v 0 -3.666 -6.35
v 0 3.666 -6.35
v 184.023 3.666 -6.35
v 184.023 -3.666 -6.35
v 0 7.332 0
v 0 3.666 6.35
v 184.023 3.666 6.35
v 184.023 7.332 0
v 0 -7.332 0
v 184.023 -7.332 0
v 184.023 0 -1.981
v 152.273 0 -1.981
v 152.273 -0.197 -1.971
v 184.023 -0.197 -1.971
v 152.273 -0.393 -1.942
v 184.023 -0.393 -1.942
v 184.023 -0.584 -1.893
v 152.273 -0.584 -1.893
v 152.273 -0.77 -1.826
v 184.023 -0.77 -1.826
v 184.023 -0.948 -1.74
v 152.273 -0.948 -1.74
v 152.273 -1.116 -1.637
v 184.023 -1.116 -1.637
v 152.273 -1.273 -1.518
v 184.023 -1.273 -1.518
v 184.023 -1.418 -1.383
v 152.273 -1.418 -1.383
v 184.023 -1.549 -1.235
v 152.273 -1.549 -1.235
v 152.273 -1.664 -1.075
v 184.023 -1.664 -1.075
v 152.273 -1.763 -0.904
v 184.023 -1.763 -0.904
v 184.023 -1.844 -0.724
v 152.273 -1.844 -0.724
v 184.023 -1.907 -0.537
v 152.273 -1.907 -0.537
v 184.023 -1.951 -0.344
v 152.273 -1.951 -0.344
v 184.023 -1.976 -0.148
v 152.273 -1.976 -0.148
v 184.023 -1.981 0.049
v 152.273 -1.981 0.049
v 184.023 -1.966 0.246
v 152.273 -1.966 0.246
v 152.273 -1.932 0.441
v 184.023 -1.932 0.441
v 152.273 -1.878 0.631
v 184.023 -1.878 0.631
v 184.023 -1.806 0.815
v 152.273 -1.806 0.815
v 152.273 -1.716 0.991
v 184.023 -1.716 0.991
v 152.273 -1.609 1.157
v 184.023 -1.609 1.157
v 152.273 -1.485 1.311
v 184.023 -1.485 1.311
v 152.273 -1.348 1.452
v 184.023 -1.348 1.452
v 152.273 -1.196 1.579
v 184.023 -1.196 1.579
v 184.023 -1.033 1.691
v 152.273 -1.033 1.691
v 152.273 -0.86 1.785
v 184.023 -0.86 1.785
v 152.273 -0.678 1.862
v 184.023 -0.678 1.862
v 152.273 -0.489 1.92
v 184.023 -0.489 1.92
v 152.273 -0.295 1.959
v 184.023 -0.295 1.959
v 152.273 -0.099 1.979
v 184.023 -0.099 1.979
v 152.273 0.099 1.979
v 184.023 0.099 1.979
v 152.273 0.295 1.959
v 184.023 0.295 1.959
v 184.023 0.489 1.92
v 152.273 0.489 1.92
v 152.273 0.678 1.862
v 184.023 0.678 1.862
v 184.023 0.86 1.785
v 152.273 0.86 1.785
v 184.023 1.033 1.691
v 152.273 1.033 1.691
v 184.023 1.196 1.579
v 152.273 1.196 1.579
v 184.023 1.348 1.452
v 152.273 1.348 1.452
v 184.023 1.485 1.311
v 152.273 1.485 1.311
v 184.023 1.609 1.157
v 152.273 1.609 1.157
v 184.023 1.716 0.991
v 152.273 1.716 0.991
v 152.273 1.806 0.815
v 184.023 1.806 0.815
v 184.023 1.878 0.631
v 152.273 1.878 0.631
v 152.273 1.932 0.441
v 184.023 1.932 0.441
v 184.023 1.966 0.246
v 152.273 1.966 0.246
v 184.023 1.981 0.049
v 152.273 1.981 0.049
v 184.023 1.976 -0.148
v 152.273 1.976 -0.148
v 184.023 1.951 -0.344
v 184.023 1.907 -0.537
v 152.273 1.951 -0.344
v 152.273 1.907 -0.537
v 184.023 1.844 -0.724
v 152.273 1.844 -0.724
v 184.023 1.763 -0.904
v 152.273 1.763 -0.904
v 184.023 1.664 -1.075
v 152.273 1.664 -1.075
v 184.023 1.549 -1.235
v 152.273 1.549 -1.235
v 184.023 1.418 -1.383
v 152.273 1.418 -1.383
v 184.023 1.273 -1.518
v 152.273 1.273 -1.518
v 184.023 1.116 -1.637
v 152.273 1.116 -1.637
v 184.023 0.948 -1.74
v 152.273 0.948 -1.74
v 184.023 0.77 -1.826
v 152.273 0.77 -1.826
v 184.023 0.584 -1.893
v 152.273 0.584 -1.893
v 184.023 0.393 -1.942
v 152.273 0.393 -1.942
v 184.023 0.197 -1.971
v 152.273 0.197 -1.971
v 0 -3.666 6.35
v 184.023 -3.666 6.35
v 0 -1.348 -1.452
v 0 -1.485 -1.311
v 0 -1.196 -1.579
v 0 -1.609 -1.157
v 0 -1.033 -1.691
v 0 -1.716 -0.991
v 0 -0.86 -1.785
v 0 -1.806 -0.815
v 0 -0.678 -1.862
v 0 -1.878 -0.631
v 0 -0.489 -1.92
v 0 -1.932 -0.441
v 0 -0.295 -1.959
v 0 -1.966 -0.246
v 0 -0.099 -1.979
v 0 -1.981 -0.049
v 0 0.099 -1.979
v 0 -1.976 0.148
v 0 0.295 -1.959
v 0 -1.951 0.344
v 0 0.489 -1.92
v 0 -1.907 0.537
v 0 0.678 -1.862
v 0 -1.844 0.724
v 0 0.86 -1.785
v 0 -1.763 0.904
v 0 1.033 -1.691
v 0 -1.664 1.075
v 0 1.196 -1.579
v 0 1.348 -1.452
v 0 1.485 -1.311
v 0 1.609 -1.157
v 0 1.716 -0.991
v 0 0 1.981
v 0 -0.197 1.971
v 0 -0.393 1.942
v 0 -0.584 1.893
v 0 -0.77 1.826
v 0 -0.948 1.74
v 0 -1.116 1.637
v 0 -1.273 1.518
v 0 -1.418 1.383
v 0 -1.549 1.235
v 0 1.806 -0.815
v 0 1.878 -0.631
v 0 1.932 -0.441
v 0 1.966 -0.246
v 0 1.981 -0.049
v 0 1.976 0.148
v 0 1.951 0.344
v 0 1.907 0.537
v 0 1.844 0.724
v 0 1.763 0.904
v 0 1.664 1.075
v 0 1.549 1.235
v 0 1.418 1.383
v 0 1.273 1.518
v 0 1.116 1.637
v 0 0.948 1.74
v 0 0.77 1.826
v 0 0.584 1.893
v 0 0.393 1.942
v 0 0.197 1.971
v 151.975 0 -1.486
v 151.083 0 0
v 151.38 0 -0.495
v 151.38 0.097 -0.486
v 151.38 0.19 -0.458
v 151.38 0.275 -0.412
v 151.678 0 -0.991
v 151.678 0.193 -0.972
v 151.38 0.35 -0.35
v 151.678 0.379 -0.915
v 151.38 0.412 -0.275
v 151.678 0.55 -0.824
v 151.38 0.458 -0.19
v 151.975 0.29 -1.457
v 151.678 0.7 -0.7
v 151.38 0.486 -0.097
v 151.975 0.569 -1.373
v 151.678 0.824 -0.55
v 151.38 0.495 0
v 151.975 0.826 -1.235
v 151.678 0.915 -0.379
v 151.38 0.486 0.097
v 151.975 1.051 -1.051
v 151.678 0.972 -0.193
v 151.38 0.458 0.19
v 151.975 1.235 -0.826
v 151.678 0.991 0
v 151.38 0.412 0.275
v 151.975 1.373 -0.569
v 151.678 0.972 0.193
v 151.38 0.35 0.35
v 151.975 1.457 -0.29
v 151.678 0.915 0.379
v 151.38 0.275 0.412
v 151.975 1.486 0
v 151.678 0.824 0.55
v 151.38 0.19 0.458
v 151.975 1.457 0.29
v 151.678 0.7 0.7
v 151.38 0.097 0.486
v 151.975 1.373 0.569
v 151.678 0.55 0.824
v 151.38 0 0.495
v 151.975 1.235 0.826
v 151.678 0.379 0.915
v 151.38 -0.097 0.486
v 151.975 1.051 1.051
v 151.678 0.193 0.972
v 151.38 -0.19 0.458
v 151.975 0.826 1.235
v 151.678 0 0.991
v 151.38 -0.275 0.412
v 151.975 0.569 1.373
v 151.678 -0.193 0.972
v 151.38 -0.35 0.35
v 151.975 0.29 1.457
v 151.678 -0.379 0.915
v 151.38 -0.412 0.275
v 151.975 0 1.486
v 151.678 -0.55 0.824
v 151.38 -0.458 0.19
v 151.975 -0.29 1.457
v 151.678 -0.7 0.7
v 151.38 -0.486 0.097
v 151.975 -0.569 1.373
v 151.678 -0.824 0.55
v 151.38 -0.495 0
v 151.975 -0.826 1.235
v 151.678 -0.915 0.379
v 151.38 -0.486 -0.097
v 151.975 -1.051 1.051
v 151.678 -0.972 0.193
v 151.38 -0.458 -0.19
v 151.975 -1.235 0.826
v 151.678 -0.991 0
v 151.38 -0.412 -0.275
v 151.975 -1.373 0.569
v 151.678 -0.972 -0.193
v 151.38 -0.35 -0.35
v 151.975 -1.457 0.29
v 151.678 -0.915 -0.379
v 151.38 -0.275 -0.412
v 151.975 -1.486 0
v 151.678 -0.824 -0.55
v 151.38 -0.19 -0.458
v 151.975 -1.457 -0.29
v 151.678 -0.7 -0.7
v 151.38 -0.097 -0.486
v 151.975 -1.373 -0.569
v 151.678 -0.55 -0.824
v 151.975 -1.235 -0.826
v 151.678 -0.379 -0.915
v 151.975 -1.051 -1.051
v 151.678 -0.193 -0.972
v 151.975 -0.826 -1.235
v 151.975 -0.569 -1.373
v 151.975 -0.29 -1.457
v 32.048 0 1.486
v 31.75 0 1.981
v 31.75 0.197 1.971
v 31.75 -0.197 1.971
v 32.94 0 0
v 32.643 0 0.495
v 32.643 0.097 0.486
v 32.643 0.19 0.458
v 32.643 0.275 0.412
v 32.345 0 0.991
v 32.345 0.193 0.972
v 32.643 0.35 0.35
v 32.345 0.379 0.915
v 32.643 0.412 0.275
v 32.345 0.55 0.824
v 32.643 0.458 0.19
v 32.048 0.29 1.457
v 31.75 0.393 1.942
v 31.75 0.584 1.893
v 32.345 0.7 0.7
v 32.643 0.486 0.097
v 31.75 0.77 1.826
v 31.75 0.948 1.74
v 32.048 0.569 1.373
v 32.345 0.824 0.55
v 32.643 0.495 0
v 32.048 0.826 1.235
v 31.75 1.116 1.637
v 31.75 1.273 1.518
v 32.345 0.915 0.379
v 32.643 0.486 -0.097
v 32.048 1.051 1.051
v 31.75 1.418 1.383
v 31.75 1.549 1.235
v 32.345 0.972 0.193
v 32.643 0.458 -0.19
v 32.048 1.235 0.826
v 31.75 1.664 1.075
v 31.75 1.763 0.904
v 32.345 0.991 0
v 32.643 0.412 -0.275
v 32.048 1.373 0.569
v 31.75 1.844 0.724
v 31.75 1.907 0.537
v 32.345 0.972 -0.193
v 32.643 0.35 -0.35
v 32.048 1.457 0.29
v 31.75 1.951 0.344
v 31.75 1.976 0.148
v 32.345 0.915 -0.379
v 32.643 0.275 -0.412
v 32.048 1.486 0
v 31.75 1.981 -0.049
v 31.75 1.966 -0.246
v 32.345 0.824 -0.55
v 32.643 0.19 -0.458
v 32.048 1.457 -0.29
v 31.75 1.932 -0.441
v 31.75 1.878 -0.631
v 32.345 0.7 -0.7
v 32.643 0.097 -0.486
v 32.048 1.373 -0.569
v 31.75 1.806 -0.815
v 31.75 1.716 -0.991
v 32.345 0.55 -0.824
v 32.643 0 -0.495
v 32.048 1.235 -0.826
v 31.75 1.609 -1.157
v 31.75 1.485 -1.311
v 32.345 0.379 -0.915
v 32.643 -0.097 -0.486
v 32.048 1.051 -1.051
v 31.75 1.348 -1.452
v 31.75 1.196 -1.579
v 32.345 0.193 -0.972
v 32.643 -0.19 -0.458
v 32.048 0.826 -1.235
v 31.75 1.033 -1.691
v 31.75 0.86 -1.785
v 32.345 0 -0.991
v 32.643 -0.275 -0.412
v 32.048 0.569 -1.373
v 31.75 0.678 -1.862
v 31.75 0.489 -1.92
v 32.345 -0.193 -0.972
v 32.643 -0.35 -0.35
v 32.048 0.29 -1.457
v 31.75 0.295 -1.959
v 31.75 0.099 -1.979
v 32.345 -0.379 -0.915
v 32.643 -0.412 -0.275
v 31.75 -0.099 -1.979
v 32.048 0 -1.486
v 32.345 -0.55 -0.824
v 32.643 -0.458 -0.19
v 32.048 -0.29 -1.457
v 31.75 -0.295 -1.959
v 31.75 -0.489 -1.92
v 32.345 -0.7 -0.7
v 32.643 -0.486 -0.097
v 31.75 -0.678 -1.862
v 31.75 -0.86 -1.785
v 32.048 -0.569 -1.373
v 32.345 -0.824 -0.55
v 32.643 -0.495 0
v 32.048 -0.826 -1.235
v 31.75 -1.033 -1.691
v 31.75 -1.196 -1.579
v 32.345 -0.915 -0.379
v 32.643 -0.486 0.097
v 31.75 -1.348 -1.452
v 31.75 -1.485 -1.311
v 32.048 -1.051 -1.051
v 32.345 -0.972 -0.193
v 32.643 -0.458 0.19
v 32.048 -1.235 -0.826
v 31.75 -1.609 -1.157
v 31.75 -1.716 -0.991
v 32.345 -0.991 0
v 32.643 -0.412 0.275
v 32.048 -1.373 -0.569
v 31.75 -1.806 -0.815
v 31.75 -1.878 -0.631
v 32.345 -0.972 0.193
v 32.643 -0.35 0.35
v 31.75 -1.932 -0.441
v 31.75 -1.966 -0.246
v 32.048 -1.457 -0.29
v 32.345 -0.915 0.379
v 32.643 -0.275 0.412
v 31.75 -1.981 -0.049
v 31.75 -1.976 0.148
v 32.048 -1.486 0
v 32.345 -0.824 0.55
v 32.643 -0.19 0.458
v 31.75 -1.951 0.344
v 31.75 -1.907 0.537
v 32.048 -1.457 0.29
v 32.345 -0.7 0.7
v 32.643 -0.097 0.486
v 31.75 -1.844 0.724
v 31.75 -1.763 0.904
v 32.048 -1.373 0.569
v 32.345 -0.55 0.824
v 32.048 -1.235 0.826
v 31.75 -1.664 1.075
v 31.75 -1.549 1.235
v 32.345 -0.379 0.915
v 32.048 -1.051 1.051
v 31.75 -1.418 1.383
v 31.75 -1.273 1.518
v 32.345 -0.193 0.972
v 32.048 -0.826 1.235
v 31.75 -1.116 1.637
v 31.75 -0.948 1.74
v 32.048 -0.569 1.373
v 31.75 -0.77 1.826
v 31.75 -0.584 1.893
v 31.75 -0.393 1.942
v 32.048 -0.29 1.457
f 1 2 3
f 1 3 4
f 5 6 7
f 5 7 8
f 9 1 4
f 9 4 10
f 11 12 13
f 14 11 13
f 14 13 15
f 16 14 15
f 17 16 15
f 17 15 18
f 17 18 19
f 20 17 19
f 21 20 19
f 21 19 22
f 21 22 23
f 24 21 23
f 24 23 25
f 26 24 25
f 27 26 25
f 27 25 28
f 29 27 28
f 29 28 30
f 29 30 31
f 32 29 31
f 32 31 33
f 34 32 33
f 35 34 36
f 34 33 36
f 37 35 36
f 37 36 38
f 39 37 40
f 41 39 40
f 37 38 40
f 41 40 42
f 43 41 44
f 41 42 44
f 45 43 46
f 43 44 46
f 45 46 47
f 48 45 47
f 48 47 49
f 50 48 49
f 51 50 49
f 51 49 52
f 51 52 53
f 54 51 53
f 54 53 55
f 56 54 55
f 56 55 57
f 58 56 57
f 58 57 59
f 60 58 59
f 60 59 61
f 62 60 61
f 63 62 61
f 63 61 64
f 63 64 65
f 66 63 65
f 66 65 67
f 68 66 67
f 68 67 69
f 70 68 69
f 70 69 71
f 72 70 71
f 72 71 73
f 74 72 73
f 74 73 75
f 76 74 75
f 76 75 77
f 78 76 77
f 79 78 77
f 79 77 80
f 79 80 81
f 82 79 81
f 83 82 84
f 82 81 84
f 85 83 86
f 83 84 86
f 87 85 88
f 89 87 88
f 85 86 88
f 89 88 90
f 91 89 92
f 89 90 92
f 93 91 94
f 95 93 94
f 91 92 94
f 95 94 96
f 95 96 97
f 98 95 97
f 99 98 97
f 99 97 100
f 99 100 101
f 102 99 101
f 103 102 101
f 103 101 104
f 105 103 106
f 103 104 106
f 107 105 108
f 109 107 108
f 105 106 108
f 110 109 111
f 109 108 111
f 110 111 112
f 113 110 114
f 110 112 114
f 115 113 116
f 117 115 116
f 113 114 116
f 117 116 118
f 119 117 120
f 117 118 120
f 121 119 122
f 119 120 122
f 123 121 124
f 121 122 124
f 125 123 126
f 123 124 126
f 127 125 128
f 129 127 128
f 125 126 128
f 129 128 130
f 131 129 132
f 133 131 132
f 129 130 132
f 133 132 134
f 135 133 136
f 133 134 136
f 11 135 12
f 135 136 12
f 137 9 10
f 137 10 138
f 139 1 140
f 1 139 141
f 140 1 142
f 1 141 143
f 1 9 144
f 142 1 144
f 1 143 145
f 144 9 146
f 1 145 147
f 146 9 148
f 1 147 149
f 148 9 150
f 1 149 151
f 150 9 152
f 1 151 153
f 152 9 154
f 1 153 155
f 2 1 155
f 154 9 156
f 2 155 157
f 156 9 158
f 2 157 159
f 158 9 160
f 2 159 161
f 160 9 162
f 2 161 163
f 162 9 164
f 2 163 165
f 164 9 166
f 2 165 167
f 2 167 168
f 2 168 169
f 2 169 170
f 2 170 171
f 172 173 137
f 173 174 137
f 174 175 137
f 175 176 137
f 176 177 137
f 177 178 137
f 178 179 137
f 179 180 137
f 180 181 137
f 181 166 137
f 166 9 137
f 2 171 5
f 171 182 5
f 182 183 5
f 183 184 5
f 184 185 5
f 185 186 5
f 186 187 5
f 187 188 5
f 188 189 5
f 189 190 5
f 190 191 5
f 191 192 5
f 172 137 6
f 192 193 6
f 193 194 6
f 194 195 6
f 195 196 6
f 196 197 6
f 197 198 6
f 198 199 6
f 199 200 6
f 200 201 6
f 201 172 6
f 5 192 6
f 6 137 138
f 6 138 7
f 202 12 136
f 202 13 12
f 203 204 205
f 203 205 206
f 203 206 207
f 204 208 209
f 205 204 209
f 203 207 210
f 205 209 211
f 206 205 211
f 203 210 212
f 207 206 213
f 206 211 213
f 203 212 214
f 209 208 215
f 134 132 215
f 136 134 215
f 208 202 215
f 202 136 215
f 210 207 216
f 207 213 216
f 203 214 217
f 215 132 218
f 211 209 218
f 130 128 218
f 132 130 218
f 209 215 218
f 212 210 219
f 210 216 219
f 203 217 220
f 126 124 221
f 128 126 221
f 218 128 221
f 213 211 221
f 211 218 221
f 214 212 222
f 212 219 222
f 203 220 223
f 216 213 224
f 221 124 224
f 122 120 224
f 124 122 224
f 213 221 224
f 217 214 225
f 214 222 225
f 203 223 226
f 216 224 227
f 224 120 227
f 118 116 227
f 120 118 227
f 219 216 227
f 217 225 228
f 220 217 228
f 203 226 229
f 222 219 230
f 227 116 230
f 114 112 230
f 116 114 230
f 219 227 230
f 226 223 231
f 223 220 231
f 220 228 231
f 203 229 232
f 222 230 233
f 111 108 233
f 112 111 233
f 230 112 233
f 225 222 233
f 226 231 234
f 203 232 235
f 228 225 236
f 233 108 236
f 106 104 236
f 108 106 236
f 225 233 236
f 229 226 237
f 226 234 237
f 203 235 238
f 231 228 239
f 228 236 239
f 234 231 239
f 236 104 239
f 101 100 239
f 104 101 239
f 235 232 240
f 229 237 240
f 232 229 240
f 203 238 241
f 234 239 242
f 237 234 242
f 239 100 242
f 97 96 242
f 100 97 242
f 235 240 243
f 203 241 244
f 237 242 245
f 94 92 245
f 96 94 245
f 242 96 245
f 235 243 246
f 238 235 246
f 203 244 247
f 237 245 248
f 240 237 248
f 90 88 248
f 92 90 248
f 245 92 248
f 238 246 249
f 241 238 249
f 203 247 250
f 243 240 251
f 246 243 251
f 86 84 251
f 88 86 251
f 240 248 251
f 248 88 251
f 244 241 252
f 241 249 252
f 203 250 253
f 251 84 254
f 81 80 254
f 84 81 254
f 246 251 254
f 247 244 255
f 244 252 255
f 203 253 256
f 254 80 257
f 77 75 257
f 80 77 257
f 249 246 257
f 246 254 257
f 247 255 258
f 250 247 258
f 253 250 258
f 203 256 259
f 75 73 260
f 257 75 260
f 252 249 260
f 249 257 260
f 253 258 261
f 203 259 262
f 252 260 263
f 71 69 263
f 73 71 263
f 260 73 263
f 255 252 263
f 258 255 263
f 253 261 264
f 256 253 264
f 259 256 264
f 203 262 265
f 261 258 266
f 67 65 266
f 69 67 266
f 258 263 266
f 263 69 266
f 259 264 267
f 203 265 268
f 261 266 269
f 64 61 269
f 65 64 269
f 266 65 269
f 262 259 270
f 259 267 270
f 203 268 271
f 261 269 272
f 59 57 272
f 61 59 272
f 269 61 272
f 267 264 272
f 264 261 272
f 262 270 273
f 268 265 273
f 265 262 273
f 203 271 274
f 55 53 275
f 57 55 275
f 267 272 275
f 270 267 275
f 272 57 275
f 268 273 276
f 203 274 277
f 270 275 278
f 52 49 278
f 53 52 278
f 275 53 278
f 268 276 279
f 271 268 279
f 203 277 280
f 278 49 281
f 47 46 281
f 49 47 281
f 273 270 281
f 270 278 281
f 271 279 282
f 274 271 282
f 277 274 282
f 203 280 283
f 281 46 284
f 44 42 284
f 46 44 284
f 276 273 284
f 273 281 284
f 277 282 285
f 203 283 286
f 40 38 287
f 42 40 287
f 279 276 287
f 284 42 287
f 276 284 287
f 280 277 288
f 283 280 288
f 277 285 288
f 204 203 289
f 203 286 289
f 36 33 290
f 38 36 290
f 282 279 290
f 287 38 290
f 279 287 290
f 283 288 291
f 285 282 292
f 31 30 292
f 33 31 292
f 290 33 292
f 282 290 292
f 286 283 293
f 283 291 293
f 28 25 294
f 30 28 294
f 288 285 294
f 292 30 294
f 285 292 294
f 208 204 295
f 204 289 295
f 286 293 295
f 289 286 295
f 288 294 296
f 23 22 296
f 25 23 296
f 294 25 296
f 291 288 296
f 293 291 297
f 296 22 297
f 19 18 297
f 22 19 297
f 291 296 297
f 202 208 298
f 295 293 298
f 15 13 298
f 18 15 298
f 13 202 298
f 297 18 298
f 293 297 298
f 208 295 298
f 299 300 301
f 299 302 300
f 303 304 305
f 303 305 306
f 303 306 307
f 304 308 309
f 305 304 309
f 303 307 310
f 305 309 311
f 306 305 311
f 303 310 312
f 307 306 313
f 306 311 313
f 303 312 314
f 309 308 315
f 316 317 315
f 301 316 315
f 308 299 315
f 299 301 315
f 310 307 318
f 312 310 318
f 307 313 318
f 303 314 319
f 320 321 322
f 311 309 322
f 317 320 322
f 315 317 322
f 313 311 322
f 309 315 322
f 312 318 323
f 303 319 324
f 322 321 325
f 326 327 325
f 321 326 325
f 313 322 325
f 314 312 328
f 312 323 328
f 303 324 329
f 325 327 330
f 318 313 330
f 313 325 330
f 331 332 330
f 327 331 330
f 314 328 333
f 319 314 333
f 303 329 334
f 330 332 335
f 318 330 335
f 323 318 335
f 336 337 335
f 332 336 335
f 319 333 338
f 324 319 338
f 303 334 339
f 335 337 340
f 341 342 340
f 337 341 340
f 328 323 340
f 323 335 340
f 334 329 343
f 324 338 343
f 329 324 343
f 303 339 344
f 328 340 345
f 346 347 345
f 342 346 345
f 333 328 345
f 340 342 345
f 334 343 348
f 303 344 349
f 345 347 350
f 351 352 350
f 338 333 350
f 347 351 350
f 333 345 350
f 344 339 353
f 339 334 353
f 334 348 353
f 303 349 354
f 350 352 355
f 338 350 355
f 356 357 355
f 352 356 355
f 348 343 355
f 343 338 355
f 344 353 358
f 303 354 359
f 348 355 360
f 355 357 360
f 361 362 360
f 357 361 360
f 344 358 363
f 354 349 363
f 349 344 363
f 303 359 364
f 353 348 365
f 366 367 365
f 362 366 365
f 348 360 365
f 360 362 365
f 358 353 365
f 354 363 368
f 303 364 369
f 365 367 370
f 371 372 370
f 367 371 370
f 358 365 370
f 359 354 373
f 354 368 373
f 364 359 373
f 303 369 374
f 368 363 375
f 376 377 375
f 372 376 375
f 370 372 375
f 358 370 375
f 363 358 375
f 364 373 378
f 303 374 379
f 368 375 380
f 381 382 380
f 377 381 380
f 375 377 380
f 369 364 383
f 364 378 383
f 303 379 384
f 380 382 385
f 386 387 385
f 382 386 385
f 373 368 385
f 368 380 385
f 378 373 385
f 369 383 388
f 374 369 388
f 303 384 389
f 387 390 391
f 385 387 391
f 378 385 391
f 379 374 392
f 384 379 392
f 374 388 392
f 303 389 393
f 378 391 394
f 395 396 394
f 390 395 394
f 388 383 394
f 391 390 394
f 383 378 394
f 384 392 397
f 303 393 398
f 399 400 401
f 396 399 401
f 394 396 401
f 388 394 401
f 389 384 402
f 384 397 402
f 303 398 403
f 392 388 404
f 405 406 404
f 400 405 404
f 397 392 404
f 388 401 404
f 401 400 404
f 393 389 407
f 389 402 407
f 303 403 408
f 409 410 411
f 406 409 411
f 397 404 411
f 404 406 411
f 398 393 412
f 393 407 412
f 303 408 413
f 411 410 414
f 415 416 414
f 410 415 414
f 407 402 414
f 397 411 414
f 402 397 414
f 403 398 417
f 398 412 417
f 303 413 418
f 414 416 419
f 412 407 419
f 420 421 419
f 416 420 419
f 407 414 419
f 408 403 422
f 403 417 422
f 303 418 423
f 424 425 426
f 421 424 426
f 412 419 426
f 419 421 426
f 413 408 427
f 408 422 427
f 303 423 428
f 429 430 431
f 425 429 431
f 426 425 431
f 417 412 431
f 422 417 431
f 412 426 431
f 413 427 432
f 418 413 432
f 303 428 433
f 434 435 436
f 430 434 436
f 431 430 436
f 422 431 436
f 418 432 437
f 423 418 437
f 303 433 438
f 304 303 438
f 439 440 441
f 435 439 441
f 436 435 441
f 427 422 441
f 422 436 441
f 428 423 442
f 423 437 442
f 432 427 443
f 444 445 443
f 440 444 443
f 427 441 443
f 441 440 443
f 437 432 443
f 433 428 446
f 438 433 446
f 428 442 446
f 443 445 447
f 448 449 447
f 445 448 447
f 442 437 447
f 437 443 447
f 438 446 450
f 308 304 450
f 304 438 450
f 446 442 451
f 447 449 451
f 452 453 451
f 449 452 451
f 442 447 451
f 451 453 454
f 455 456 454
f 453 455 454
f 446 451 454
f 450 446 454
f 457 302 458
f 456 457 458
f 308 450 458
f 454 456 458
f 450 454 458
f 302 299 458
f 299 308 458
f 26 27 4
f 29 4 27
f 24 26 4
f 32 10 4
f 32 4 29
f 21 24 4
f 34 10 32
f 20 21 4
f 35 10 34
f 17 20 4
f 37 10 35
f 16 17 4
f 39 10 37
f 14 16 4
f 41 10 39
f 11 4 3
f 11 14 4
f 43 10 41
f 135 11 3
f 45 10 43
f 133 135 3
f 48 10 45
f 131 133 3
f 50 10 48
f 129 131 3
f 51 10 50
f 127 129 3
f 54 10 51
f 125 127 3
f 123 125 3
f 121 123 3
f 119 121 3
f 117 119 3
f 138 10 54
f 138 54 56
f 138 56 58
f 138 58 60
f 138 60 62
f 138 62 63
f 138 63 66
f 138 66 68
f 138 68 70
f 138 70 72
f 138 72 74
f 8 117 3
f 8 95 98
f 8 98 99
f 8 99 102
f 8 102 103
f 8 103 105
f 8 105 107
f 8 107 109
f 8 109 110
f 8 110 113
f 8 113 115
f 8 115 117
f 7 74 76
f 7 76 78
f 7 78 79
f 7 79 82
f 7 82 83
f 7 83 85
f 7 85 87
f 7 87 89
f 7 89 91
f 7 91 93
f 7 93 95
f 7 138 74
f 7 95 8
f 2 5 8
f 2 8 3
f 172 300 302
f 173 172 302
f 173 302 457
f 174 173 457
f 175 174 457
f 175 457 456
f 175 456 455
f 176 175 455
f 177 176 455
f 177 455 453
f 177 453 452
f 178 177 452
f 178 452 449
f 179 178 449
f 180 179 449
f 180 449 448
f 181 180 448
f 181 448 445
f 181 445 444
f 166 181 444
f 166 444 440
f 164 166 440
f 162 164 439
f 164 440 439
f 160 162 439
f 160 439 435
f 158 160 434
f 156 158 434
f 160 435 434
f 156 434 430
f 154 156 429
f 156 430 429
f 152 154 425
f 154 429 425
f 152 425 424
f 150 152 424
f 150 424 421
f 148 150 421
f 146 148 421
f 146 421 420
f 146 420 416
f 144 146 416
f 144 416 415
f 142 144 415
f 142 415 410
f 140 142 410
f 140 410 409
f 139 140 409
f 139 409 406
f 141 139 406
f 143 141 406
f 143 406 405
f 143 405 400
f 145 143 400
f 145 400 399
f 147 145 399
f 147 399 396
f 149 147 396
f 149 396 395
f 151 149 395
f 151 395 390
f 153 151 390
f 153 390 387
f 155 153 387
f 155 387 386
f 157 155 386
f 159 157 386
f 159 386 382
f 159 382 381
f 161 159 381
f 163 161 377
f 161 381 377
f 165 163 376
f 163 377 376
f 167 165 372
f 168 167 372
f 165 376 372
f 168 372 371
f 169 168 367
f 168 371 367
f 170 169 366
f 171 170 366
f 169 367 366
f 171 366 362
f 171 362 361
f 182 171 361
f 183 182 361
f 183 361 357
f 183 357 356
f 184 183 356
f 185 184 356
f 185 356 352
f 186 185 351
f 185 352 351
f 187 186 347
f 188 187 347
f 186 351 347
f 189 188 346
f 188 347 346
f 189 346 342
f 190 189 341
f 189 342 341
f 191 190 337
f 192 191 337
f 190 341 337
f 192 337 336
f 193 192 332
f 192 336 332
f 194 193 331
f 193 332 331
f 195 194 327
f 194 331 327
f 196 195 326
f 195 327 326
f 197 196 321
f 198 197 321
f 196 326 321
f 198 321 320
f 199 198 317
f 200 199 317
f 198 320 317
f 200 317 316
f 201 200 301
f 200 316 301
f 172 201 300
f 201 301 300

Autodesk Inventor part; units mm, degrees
ref_plane "YZ Plane" through (0, 0, 0) normal (1, 0, 0) x (0, 1, 0)
ref_plane "XZ Plane" through (0, 0, 0) normal (0, 1, 0) x (-1, 0, 0)
ref_plane "XY Plane" through (0, 0, 0) normal (0, 0, 1) x (1, 0, 0)
sketch "Sketch1" plane through (0, 0, 0) normal (1, 0, 0) x (0, 1, 0)
  line L0 (-3.6662, -6.35) -> (-7.3323, 0)
  line L1 (-7.3323, 0) -> (-3.6662, 6.35)
  line L2 (-3.6662, 6.35) -> (3.6662, 6.35)
  line L3 (3.6662, 6.35) -> (7.3323, 0)
  line L4 (7.3323, 0) -> (3.6662, -6.35)
  line L5 (3.6662, -6.35) -> (-3.6662, -6.35)
  point P0 (0, 0)
  point P1 (0, 0)
  dimension "d0" = 12.7
extrude "Extrusion1" add sketch "Sketch1" along normal blind 184.023
sketch "Sketch2" plane through (184.023, 0, 0) normal (1, 0, 0) x (0, 0, -1)
  point P0 (0, 0)
  point P1 (0, 0)
hole "Hole1" at (184.023, 0, 0) direction (-1, 0, 0) diameter 3.9624 depth 31.75 tip angle 118 thread size "10-32 UNF" class "2B" standard "ANSI Unified Screw Threads"
sketch "Sketch3" plane through (0, 0, 0) normal (-1, 0, 0) x (0, 0, 1)
  circle A0 centre (0, 0) radius 1.9812 projected
hole "Hole2" at (0, 0, 0) direction (1, 0, 0) diameter 3.9624 depth 31.75 tip angle 118 thread size "10-32 UNF" class "2B" standard "ANSI Unified Screw Threads"
properties part number "STOCK,HEX,SHAFT,KICKER,FRONT" material "Aluminum 6061"
